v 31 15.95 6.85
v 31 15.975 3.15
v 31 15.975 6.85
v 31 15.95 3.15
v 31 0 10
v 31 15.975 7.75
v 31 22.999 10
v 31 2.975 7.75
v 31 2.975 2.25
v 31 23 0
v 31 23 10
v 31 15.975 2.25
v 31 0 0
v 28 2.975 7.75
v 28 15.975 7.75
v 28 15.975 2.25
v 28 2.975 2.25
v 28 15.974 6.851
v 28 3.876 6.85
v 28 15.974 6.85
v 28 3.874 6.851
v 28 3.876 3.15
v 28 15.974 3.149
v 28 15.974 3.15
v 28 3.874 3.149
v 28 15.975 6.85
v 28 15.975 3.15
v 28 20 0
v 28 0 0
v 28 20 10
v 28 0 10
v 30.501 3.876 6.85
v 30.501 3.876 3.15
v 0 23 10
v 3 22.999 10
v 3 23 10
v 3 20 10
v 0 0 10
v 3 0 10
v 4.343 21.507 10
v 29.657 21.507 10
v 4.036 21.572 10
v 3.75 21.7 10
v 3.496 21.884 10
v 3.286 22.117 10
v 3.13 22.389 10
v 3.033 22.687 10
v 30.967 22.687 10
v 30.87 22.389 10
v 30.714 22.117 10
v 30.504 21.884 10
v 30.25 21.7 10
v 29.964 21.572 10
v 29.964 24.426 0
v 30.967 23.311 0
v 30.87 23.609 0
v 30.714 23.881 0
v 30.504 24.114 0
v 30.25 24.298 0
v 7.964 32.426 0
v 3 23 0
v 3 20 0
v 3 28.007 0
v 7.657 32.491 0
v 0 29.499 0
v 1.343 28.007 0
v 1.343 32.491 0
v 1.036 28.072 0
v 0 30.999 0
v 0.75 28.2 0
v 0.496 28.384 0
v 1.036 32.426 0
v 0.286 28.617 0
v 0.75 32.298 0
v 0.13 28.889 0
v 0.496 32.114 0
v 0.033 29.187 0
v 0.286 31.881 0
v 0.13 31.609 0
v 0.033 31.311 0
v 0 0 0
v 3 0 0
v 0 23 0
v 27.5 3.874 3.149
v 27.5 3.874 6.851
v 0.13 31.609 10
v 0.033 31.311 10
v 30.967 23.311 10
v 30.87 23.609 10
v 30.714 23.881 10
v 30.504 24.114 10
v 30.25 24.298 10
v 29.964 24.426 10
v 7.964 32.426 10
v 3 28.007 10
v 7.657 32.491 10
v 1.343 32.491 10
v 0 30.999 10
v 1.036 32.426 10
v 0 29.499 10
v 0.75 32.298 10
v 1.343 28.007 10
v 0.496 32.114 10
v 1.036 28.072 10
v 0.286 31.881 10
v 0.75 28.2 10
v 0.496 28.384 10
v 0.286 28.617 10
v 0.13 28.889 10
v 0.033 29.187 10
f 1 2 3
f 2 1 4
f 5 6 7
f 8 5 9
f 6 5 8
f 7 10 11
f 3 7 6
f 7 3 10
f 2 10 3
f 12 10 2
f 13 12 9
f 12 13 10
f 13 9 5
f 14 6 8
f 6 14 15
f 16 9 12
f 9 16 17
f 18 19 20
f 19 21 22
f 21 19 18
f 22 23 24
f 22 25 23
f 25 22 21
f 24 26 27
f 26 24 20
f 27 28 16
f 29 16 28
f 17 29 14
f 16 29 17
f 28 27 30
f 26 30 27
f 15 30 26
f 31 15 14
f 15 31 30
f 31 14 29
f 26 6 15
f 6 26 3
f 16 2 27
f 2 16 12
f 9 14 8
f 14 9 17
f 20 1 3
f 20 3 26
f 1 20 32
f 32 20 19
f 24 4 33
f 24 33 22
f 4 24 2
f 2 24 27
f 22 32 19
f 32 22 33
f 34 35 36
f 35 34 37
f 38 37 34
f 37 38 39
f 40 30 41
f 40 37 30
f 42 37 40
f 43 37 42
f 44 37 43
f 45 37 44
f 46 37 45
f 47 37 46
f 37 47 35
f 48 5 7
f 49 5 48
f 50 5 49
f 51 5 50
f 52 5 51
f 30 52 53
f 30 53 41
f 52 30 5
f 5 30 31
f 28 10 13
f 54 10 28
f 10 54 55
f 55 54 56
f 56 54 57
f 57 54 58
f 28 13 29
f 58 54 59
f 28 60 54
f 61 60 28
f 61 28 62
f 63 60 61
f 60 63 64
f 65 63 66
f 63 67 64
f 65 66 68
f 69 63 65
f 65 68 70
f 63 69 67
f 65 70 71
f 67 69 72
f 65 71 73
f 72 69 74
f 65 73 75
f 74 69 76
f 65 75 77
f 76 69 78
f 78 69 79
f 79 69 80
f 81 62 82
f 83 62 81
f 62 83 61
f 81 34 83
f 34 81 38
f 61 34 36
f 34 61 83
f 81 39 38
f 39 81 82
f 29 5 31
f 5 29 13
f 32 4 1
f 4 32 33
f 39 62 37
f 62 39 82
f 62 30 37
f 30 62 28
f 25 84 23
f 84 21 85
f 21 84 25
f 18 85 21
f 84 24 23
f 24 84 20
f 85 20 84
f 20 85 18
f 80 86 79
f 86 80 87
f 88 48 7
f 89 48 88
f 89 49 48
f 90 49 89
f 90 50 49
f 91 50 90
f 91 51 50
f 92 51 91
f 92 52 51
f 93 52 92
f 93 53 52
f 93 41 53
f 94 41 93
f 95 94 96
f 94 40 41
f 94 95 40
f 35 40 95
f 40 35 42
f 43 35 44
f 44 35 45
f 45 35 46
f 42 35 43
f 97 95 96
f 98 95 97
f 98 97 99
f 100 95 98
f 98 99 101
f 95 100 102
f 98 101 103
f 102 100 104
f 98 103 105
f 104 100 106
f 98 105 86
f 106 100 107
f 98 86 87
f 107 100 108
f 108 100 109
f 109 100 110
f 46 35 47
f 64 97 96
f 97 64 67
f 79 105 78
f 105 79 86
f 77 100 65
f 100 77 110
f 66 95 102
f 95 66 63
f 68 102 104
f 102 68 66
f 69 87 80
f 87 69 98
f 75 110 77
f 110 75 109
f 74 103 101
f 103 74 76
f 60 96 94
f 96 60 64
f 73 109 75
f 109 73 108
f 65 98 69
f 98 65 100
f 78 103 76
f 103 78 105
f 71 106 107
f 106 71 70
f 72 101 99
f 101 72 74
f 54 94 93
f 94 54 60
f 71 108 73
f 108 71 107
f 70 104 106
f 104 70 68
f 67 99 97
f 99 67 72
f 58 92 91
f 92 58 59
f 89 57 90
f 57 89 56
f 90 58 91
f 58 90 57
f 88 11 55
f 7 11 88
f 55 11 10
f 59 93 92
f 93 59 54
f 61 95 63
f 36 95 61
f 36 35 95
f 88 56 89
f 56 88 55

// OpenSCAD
// [FL_INDEX: keywords="openscad, 3d_parametric, Customizable_Headset_hook, csg_solid" | COT="Parametric OpenSCAD design from 3DCodeverse"]
// Title: Customizable Headset hook

//Change the following values to your needs.
// Size of your desk. x>0
desk_size = 25;

// Width of your headphone.
cradle_width = 5;

// Thickness of your headphone.
cradle_height = 3;

// Size of the walls of the object. x>0
wall_size = 3;

// Width of the clamp. x>0
clamp_width = 10;

// Depth of the clamp. x>0
clamp_depth = 20;

// Determines tightness of clamp. 0=<x<wall_size
tightinator_offset = .5;

// Preferred relative width of the tightinator. 0 <=x< 1
tightinator_width = .55;

// Preferred relative height/depth of the tightinator. 0 <=x< 1 
tightinator_height = .65;

// Size of the gap around the tightinator (cut-out). 0 <=x<= tightinator_width*12.5 (roughly)
cutout = .9;

// Preferred width of the hook. 0<x
hook_width = 10;

// Place the hook at the left, right, or centre.
hook_position = "centre"; // [left, centre, right]

// STOP! No need to change these values:
left = clamp_width-hook_width;
centre = clamp_width/2-hook_width/2;
right = 1 * 0;

//
// Here be code...
//

// Some voodoo to bypass the customizer
if (hook_position == "centre") {
	thing(centre);
} else if (hook_position == "right") {
	thing(right);
} else {
	thing(left);
}

// This is the proverbial "it". TADA.wav!
module thing(hookpos)
{
    render()
	union() {
		clamp();
		hook(hookpos);
	}
}

// The part that fits on the desk.
module clamp() {
	union(){
	difference() {
		//main body
		cube([desk_size+2*wall_size,clamp_depth+wall_size,clamp_width]);
		translate([desk_size+wall_size+.001,0,0])
		  #clamp_angle();
		translate([wall_size, 0, 0])
		  cube([desk_size,clamp_depth,clamp_width]);
		//cut-out part
		translate([desk_size+wall_size, (1-tightinator_height)/2*(clamp_depth-wall_size), (1-tightinator_width)/2*clamp_width])
	  	  difference() {
			cube([wall_size,clamp_depth*tightinator_height,clamp_width*tightinator_width]);
			translate([0, cutout+.001, cutout])
		  	cube([wall_size,(clamp_depth*tightinator_height)-cutout,(clamp_width*tightinator_width)-2*cutout]);
	      }		
	}
	translate([desk_size,0,0])
	  clamp_angle();
	}
}

// The TIGHTINATOR. Part of the clamp.
module clamp_angle() {
	a = ((1-tightinator_height)/2*(clamp_depth-wall_size))+cutout-.001;
	b = a + ((clamp_depth*tightinator_height)-cutout);
	translate([0,0,(1-tightinator_width)/2*clamp_width+cutout-.001])
	linear_extrude(height=(clamp_width*tightinator_width+.001)-2*cutout+.001) polygon([[wall_size,a],[wall_size,b],[wall_size-tightinator_offset,a]]);
}

// The part your headset hangs on/off.
module hook(hookpos) {
$fn=30;
translate([wall_size/2, clamp_depth+wall_size-0.001, hookpos])
	minkowski(){
		difference() {
			linear_extrude(height=hook_width) polygon([[cradle_height,0],[cradle_height,cradle_width+wall_size/2],[0,cradle_width+wall_size/2],[0,cradle_width+wall_size],[cradle_height+wall_size,cradle_width+wall_size],[desk_size+wall_size,0]]);
			//cylinder(h = hook_width, r = cradle_width+wall_size);
		} 
		cylinder(h = 0.0001, r = wall_size/2);
	}
}
